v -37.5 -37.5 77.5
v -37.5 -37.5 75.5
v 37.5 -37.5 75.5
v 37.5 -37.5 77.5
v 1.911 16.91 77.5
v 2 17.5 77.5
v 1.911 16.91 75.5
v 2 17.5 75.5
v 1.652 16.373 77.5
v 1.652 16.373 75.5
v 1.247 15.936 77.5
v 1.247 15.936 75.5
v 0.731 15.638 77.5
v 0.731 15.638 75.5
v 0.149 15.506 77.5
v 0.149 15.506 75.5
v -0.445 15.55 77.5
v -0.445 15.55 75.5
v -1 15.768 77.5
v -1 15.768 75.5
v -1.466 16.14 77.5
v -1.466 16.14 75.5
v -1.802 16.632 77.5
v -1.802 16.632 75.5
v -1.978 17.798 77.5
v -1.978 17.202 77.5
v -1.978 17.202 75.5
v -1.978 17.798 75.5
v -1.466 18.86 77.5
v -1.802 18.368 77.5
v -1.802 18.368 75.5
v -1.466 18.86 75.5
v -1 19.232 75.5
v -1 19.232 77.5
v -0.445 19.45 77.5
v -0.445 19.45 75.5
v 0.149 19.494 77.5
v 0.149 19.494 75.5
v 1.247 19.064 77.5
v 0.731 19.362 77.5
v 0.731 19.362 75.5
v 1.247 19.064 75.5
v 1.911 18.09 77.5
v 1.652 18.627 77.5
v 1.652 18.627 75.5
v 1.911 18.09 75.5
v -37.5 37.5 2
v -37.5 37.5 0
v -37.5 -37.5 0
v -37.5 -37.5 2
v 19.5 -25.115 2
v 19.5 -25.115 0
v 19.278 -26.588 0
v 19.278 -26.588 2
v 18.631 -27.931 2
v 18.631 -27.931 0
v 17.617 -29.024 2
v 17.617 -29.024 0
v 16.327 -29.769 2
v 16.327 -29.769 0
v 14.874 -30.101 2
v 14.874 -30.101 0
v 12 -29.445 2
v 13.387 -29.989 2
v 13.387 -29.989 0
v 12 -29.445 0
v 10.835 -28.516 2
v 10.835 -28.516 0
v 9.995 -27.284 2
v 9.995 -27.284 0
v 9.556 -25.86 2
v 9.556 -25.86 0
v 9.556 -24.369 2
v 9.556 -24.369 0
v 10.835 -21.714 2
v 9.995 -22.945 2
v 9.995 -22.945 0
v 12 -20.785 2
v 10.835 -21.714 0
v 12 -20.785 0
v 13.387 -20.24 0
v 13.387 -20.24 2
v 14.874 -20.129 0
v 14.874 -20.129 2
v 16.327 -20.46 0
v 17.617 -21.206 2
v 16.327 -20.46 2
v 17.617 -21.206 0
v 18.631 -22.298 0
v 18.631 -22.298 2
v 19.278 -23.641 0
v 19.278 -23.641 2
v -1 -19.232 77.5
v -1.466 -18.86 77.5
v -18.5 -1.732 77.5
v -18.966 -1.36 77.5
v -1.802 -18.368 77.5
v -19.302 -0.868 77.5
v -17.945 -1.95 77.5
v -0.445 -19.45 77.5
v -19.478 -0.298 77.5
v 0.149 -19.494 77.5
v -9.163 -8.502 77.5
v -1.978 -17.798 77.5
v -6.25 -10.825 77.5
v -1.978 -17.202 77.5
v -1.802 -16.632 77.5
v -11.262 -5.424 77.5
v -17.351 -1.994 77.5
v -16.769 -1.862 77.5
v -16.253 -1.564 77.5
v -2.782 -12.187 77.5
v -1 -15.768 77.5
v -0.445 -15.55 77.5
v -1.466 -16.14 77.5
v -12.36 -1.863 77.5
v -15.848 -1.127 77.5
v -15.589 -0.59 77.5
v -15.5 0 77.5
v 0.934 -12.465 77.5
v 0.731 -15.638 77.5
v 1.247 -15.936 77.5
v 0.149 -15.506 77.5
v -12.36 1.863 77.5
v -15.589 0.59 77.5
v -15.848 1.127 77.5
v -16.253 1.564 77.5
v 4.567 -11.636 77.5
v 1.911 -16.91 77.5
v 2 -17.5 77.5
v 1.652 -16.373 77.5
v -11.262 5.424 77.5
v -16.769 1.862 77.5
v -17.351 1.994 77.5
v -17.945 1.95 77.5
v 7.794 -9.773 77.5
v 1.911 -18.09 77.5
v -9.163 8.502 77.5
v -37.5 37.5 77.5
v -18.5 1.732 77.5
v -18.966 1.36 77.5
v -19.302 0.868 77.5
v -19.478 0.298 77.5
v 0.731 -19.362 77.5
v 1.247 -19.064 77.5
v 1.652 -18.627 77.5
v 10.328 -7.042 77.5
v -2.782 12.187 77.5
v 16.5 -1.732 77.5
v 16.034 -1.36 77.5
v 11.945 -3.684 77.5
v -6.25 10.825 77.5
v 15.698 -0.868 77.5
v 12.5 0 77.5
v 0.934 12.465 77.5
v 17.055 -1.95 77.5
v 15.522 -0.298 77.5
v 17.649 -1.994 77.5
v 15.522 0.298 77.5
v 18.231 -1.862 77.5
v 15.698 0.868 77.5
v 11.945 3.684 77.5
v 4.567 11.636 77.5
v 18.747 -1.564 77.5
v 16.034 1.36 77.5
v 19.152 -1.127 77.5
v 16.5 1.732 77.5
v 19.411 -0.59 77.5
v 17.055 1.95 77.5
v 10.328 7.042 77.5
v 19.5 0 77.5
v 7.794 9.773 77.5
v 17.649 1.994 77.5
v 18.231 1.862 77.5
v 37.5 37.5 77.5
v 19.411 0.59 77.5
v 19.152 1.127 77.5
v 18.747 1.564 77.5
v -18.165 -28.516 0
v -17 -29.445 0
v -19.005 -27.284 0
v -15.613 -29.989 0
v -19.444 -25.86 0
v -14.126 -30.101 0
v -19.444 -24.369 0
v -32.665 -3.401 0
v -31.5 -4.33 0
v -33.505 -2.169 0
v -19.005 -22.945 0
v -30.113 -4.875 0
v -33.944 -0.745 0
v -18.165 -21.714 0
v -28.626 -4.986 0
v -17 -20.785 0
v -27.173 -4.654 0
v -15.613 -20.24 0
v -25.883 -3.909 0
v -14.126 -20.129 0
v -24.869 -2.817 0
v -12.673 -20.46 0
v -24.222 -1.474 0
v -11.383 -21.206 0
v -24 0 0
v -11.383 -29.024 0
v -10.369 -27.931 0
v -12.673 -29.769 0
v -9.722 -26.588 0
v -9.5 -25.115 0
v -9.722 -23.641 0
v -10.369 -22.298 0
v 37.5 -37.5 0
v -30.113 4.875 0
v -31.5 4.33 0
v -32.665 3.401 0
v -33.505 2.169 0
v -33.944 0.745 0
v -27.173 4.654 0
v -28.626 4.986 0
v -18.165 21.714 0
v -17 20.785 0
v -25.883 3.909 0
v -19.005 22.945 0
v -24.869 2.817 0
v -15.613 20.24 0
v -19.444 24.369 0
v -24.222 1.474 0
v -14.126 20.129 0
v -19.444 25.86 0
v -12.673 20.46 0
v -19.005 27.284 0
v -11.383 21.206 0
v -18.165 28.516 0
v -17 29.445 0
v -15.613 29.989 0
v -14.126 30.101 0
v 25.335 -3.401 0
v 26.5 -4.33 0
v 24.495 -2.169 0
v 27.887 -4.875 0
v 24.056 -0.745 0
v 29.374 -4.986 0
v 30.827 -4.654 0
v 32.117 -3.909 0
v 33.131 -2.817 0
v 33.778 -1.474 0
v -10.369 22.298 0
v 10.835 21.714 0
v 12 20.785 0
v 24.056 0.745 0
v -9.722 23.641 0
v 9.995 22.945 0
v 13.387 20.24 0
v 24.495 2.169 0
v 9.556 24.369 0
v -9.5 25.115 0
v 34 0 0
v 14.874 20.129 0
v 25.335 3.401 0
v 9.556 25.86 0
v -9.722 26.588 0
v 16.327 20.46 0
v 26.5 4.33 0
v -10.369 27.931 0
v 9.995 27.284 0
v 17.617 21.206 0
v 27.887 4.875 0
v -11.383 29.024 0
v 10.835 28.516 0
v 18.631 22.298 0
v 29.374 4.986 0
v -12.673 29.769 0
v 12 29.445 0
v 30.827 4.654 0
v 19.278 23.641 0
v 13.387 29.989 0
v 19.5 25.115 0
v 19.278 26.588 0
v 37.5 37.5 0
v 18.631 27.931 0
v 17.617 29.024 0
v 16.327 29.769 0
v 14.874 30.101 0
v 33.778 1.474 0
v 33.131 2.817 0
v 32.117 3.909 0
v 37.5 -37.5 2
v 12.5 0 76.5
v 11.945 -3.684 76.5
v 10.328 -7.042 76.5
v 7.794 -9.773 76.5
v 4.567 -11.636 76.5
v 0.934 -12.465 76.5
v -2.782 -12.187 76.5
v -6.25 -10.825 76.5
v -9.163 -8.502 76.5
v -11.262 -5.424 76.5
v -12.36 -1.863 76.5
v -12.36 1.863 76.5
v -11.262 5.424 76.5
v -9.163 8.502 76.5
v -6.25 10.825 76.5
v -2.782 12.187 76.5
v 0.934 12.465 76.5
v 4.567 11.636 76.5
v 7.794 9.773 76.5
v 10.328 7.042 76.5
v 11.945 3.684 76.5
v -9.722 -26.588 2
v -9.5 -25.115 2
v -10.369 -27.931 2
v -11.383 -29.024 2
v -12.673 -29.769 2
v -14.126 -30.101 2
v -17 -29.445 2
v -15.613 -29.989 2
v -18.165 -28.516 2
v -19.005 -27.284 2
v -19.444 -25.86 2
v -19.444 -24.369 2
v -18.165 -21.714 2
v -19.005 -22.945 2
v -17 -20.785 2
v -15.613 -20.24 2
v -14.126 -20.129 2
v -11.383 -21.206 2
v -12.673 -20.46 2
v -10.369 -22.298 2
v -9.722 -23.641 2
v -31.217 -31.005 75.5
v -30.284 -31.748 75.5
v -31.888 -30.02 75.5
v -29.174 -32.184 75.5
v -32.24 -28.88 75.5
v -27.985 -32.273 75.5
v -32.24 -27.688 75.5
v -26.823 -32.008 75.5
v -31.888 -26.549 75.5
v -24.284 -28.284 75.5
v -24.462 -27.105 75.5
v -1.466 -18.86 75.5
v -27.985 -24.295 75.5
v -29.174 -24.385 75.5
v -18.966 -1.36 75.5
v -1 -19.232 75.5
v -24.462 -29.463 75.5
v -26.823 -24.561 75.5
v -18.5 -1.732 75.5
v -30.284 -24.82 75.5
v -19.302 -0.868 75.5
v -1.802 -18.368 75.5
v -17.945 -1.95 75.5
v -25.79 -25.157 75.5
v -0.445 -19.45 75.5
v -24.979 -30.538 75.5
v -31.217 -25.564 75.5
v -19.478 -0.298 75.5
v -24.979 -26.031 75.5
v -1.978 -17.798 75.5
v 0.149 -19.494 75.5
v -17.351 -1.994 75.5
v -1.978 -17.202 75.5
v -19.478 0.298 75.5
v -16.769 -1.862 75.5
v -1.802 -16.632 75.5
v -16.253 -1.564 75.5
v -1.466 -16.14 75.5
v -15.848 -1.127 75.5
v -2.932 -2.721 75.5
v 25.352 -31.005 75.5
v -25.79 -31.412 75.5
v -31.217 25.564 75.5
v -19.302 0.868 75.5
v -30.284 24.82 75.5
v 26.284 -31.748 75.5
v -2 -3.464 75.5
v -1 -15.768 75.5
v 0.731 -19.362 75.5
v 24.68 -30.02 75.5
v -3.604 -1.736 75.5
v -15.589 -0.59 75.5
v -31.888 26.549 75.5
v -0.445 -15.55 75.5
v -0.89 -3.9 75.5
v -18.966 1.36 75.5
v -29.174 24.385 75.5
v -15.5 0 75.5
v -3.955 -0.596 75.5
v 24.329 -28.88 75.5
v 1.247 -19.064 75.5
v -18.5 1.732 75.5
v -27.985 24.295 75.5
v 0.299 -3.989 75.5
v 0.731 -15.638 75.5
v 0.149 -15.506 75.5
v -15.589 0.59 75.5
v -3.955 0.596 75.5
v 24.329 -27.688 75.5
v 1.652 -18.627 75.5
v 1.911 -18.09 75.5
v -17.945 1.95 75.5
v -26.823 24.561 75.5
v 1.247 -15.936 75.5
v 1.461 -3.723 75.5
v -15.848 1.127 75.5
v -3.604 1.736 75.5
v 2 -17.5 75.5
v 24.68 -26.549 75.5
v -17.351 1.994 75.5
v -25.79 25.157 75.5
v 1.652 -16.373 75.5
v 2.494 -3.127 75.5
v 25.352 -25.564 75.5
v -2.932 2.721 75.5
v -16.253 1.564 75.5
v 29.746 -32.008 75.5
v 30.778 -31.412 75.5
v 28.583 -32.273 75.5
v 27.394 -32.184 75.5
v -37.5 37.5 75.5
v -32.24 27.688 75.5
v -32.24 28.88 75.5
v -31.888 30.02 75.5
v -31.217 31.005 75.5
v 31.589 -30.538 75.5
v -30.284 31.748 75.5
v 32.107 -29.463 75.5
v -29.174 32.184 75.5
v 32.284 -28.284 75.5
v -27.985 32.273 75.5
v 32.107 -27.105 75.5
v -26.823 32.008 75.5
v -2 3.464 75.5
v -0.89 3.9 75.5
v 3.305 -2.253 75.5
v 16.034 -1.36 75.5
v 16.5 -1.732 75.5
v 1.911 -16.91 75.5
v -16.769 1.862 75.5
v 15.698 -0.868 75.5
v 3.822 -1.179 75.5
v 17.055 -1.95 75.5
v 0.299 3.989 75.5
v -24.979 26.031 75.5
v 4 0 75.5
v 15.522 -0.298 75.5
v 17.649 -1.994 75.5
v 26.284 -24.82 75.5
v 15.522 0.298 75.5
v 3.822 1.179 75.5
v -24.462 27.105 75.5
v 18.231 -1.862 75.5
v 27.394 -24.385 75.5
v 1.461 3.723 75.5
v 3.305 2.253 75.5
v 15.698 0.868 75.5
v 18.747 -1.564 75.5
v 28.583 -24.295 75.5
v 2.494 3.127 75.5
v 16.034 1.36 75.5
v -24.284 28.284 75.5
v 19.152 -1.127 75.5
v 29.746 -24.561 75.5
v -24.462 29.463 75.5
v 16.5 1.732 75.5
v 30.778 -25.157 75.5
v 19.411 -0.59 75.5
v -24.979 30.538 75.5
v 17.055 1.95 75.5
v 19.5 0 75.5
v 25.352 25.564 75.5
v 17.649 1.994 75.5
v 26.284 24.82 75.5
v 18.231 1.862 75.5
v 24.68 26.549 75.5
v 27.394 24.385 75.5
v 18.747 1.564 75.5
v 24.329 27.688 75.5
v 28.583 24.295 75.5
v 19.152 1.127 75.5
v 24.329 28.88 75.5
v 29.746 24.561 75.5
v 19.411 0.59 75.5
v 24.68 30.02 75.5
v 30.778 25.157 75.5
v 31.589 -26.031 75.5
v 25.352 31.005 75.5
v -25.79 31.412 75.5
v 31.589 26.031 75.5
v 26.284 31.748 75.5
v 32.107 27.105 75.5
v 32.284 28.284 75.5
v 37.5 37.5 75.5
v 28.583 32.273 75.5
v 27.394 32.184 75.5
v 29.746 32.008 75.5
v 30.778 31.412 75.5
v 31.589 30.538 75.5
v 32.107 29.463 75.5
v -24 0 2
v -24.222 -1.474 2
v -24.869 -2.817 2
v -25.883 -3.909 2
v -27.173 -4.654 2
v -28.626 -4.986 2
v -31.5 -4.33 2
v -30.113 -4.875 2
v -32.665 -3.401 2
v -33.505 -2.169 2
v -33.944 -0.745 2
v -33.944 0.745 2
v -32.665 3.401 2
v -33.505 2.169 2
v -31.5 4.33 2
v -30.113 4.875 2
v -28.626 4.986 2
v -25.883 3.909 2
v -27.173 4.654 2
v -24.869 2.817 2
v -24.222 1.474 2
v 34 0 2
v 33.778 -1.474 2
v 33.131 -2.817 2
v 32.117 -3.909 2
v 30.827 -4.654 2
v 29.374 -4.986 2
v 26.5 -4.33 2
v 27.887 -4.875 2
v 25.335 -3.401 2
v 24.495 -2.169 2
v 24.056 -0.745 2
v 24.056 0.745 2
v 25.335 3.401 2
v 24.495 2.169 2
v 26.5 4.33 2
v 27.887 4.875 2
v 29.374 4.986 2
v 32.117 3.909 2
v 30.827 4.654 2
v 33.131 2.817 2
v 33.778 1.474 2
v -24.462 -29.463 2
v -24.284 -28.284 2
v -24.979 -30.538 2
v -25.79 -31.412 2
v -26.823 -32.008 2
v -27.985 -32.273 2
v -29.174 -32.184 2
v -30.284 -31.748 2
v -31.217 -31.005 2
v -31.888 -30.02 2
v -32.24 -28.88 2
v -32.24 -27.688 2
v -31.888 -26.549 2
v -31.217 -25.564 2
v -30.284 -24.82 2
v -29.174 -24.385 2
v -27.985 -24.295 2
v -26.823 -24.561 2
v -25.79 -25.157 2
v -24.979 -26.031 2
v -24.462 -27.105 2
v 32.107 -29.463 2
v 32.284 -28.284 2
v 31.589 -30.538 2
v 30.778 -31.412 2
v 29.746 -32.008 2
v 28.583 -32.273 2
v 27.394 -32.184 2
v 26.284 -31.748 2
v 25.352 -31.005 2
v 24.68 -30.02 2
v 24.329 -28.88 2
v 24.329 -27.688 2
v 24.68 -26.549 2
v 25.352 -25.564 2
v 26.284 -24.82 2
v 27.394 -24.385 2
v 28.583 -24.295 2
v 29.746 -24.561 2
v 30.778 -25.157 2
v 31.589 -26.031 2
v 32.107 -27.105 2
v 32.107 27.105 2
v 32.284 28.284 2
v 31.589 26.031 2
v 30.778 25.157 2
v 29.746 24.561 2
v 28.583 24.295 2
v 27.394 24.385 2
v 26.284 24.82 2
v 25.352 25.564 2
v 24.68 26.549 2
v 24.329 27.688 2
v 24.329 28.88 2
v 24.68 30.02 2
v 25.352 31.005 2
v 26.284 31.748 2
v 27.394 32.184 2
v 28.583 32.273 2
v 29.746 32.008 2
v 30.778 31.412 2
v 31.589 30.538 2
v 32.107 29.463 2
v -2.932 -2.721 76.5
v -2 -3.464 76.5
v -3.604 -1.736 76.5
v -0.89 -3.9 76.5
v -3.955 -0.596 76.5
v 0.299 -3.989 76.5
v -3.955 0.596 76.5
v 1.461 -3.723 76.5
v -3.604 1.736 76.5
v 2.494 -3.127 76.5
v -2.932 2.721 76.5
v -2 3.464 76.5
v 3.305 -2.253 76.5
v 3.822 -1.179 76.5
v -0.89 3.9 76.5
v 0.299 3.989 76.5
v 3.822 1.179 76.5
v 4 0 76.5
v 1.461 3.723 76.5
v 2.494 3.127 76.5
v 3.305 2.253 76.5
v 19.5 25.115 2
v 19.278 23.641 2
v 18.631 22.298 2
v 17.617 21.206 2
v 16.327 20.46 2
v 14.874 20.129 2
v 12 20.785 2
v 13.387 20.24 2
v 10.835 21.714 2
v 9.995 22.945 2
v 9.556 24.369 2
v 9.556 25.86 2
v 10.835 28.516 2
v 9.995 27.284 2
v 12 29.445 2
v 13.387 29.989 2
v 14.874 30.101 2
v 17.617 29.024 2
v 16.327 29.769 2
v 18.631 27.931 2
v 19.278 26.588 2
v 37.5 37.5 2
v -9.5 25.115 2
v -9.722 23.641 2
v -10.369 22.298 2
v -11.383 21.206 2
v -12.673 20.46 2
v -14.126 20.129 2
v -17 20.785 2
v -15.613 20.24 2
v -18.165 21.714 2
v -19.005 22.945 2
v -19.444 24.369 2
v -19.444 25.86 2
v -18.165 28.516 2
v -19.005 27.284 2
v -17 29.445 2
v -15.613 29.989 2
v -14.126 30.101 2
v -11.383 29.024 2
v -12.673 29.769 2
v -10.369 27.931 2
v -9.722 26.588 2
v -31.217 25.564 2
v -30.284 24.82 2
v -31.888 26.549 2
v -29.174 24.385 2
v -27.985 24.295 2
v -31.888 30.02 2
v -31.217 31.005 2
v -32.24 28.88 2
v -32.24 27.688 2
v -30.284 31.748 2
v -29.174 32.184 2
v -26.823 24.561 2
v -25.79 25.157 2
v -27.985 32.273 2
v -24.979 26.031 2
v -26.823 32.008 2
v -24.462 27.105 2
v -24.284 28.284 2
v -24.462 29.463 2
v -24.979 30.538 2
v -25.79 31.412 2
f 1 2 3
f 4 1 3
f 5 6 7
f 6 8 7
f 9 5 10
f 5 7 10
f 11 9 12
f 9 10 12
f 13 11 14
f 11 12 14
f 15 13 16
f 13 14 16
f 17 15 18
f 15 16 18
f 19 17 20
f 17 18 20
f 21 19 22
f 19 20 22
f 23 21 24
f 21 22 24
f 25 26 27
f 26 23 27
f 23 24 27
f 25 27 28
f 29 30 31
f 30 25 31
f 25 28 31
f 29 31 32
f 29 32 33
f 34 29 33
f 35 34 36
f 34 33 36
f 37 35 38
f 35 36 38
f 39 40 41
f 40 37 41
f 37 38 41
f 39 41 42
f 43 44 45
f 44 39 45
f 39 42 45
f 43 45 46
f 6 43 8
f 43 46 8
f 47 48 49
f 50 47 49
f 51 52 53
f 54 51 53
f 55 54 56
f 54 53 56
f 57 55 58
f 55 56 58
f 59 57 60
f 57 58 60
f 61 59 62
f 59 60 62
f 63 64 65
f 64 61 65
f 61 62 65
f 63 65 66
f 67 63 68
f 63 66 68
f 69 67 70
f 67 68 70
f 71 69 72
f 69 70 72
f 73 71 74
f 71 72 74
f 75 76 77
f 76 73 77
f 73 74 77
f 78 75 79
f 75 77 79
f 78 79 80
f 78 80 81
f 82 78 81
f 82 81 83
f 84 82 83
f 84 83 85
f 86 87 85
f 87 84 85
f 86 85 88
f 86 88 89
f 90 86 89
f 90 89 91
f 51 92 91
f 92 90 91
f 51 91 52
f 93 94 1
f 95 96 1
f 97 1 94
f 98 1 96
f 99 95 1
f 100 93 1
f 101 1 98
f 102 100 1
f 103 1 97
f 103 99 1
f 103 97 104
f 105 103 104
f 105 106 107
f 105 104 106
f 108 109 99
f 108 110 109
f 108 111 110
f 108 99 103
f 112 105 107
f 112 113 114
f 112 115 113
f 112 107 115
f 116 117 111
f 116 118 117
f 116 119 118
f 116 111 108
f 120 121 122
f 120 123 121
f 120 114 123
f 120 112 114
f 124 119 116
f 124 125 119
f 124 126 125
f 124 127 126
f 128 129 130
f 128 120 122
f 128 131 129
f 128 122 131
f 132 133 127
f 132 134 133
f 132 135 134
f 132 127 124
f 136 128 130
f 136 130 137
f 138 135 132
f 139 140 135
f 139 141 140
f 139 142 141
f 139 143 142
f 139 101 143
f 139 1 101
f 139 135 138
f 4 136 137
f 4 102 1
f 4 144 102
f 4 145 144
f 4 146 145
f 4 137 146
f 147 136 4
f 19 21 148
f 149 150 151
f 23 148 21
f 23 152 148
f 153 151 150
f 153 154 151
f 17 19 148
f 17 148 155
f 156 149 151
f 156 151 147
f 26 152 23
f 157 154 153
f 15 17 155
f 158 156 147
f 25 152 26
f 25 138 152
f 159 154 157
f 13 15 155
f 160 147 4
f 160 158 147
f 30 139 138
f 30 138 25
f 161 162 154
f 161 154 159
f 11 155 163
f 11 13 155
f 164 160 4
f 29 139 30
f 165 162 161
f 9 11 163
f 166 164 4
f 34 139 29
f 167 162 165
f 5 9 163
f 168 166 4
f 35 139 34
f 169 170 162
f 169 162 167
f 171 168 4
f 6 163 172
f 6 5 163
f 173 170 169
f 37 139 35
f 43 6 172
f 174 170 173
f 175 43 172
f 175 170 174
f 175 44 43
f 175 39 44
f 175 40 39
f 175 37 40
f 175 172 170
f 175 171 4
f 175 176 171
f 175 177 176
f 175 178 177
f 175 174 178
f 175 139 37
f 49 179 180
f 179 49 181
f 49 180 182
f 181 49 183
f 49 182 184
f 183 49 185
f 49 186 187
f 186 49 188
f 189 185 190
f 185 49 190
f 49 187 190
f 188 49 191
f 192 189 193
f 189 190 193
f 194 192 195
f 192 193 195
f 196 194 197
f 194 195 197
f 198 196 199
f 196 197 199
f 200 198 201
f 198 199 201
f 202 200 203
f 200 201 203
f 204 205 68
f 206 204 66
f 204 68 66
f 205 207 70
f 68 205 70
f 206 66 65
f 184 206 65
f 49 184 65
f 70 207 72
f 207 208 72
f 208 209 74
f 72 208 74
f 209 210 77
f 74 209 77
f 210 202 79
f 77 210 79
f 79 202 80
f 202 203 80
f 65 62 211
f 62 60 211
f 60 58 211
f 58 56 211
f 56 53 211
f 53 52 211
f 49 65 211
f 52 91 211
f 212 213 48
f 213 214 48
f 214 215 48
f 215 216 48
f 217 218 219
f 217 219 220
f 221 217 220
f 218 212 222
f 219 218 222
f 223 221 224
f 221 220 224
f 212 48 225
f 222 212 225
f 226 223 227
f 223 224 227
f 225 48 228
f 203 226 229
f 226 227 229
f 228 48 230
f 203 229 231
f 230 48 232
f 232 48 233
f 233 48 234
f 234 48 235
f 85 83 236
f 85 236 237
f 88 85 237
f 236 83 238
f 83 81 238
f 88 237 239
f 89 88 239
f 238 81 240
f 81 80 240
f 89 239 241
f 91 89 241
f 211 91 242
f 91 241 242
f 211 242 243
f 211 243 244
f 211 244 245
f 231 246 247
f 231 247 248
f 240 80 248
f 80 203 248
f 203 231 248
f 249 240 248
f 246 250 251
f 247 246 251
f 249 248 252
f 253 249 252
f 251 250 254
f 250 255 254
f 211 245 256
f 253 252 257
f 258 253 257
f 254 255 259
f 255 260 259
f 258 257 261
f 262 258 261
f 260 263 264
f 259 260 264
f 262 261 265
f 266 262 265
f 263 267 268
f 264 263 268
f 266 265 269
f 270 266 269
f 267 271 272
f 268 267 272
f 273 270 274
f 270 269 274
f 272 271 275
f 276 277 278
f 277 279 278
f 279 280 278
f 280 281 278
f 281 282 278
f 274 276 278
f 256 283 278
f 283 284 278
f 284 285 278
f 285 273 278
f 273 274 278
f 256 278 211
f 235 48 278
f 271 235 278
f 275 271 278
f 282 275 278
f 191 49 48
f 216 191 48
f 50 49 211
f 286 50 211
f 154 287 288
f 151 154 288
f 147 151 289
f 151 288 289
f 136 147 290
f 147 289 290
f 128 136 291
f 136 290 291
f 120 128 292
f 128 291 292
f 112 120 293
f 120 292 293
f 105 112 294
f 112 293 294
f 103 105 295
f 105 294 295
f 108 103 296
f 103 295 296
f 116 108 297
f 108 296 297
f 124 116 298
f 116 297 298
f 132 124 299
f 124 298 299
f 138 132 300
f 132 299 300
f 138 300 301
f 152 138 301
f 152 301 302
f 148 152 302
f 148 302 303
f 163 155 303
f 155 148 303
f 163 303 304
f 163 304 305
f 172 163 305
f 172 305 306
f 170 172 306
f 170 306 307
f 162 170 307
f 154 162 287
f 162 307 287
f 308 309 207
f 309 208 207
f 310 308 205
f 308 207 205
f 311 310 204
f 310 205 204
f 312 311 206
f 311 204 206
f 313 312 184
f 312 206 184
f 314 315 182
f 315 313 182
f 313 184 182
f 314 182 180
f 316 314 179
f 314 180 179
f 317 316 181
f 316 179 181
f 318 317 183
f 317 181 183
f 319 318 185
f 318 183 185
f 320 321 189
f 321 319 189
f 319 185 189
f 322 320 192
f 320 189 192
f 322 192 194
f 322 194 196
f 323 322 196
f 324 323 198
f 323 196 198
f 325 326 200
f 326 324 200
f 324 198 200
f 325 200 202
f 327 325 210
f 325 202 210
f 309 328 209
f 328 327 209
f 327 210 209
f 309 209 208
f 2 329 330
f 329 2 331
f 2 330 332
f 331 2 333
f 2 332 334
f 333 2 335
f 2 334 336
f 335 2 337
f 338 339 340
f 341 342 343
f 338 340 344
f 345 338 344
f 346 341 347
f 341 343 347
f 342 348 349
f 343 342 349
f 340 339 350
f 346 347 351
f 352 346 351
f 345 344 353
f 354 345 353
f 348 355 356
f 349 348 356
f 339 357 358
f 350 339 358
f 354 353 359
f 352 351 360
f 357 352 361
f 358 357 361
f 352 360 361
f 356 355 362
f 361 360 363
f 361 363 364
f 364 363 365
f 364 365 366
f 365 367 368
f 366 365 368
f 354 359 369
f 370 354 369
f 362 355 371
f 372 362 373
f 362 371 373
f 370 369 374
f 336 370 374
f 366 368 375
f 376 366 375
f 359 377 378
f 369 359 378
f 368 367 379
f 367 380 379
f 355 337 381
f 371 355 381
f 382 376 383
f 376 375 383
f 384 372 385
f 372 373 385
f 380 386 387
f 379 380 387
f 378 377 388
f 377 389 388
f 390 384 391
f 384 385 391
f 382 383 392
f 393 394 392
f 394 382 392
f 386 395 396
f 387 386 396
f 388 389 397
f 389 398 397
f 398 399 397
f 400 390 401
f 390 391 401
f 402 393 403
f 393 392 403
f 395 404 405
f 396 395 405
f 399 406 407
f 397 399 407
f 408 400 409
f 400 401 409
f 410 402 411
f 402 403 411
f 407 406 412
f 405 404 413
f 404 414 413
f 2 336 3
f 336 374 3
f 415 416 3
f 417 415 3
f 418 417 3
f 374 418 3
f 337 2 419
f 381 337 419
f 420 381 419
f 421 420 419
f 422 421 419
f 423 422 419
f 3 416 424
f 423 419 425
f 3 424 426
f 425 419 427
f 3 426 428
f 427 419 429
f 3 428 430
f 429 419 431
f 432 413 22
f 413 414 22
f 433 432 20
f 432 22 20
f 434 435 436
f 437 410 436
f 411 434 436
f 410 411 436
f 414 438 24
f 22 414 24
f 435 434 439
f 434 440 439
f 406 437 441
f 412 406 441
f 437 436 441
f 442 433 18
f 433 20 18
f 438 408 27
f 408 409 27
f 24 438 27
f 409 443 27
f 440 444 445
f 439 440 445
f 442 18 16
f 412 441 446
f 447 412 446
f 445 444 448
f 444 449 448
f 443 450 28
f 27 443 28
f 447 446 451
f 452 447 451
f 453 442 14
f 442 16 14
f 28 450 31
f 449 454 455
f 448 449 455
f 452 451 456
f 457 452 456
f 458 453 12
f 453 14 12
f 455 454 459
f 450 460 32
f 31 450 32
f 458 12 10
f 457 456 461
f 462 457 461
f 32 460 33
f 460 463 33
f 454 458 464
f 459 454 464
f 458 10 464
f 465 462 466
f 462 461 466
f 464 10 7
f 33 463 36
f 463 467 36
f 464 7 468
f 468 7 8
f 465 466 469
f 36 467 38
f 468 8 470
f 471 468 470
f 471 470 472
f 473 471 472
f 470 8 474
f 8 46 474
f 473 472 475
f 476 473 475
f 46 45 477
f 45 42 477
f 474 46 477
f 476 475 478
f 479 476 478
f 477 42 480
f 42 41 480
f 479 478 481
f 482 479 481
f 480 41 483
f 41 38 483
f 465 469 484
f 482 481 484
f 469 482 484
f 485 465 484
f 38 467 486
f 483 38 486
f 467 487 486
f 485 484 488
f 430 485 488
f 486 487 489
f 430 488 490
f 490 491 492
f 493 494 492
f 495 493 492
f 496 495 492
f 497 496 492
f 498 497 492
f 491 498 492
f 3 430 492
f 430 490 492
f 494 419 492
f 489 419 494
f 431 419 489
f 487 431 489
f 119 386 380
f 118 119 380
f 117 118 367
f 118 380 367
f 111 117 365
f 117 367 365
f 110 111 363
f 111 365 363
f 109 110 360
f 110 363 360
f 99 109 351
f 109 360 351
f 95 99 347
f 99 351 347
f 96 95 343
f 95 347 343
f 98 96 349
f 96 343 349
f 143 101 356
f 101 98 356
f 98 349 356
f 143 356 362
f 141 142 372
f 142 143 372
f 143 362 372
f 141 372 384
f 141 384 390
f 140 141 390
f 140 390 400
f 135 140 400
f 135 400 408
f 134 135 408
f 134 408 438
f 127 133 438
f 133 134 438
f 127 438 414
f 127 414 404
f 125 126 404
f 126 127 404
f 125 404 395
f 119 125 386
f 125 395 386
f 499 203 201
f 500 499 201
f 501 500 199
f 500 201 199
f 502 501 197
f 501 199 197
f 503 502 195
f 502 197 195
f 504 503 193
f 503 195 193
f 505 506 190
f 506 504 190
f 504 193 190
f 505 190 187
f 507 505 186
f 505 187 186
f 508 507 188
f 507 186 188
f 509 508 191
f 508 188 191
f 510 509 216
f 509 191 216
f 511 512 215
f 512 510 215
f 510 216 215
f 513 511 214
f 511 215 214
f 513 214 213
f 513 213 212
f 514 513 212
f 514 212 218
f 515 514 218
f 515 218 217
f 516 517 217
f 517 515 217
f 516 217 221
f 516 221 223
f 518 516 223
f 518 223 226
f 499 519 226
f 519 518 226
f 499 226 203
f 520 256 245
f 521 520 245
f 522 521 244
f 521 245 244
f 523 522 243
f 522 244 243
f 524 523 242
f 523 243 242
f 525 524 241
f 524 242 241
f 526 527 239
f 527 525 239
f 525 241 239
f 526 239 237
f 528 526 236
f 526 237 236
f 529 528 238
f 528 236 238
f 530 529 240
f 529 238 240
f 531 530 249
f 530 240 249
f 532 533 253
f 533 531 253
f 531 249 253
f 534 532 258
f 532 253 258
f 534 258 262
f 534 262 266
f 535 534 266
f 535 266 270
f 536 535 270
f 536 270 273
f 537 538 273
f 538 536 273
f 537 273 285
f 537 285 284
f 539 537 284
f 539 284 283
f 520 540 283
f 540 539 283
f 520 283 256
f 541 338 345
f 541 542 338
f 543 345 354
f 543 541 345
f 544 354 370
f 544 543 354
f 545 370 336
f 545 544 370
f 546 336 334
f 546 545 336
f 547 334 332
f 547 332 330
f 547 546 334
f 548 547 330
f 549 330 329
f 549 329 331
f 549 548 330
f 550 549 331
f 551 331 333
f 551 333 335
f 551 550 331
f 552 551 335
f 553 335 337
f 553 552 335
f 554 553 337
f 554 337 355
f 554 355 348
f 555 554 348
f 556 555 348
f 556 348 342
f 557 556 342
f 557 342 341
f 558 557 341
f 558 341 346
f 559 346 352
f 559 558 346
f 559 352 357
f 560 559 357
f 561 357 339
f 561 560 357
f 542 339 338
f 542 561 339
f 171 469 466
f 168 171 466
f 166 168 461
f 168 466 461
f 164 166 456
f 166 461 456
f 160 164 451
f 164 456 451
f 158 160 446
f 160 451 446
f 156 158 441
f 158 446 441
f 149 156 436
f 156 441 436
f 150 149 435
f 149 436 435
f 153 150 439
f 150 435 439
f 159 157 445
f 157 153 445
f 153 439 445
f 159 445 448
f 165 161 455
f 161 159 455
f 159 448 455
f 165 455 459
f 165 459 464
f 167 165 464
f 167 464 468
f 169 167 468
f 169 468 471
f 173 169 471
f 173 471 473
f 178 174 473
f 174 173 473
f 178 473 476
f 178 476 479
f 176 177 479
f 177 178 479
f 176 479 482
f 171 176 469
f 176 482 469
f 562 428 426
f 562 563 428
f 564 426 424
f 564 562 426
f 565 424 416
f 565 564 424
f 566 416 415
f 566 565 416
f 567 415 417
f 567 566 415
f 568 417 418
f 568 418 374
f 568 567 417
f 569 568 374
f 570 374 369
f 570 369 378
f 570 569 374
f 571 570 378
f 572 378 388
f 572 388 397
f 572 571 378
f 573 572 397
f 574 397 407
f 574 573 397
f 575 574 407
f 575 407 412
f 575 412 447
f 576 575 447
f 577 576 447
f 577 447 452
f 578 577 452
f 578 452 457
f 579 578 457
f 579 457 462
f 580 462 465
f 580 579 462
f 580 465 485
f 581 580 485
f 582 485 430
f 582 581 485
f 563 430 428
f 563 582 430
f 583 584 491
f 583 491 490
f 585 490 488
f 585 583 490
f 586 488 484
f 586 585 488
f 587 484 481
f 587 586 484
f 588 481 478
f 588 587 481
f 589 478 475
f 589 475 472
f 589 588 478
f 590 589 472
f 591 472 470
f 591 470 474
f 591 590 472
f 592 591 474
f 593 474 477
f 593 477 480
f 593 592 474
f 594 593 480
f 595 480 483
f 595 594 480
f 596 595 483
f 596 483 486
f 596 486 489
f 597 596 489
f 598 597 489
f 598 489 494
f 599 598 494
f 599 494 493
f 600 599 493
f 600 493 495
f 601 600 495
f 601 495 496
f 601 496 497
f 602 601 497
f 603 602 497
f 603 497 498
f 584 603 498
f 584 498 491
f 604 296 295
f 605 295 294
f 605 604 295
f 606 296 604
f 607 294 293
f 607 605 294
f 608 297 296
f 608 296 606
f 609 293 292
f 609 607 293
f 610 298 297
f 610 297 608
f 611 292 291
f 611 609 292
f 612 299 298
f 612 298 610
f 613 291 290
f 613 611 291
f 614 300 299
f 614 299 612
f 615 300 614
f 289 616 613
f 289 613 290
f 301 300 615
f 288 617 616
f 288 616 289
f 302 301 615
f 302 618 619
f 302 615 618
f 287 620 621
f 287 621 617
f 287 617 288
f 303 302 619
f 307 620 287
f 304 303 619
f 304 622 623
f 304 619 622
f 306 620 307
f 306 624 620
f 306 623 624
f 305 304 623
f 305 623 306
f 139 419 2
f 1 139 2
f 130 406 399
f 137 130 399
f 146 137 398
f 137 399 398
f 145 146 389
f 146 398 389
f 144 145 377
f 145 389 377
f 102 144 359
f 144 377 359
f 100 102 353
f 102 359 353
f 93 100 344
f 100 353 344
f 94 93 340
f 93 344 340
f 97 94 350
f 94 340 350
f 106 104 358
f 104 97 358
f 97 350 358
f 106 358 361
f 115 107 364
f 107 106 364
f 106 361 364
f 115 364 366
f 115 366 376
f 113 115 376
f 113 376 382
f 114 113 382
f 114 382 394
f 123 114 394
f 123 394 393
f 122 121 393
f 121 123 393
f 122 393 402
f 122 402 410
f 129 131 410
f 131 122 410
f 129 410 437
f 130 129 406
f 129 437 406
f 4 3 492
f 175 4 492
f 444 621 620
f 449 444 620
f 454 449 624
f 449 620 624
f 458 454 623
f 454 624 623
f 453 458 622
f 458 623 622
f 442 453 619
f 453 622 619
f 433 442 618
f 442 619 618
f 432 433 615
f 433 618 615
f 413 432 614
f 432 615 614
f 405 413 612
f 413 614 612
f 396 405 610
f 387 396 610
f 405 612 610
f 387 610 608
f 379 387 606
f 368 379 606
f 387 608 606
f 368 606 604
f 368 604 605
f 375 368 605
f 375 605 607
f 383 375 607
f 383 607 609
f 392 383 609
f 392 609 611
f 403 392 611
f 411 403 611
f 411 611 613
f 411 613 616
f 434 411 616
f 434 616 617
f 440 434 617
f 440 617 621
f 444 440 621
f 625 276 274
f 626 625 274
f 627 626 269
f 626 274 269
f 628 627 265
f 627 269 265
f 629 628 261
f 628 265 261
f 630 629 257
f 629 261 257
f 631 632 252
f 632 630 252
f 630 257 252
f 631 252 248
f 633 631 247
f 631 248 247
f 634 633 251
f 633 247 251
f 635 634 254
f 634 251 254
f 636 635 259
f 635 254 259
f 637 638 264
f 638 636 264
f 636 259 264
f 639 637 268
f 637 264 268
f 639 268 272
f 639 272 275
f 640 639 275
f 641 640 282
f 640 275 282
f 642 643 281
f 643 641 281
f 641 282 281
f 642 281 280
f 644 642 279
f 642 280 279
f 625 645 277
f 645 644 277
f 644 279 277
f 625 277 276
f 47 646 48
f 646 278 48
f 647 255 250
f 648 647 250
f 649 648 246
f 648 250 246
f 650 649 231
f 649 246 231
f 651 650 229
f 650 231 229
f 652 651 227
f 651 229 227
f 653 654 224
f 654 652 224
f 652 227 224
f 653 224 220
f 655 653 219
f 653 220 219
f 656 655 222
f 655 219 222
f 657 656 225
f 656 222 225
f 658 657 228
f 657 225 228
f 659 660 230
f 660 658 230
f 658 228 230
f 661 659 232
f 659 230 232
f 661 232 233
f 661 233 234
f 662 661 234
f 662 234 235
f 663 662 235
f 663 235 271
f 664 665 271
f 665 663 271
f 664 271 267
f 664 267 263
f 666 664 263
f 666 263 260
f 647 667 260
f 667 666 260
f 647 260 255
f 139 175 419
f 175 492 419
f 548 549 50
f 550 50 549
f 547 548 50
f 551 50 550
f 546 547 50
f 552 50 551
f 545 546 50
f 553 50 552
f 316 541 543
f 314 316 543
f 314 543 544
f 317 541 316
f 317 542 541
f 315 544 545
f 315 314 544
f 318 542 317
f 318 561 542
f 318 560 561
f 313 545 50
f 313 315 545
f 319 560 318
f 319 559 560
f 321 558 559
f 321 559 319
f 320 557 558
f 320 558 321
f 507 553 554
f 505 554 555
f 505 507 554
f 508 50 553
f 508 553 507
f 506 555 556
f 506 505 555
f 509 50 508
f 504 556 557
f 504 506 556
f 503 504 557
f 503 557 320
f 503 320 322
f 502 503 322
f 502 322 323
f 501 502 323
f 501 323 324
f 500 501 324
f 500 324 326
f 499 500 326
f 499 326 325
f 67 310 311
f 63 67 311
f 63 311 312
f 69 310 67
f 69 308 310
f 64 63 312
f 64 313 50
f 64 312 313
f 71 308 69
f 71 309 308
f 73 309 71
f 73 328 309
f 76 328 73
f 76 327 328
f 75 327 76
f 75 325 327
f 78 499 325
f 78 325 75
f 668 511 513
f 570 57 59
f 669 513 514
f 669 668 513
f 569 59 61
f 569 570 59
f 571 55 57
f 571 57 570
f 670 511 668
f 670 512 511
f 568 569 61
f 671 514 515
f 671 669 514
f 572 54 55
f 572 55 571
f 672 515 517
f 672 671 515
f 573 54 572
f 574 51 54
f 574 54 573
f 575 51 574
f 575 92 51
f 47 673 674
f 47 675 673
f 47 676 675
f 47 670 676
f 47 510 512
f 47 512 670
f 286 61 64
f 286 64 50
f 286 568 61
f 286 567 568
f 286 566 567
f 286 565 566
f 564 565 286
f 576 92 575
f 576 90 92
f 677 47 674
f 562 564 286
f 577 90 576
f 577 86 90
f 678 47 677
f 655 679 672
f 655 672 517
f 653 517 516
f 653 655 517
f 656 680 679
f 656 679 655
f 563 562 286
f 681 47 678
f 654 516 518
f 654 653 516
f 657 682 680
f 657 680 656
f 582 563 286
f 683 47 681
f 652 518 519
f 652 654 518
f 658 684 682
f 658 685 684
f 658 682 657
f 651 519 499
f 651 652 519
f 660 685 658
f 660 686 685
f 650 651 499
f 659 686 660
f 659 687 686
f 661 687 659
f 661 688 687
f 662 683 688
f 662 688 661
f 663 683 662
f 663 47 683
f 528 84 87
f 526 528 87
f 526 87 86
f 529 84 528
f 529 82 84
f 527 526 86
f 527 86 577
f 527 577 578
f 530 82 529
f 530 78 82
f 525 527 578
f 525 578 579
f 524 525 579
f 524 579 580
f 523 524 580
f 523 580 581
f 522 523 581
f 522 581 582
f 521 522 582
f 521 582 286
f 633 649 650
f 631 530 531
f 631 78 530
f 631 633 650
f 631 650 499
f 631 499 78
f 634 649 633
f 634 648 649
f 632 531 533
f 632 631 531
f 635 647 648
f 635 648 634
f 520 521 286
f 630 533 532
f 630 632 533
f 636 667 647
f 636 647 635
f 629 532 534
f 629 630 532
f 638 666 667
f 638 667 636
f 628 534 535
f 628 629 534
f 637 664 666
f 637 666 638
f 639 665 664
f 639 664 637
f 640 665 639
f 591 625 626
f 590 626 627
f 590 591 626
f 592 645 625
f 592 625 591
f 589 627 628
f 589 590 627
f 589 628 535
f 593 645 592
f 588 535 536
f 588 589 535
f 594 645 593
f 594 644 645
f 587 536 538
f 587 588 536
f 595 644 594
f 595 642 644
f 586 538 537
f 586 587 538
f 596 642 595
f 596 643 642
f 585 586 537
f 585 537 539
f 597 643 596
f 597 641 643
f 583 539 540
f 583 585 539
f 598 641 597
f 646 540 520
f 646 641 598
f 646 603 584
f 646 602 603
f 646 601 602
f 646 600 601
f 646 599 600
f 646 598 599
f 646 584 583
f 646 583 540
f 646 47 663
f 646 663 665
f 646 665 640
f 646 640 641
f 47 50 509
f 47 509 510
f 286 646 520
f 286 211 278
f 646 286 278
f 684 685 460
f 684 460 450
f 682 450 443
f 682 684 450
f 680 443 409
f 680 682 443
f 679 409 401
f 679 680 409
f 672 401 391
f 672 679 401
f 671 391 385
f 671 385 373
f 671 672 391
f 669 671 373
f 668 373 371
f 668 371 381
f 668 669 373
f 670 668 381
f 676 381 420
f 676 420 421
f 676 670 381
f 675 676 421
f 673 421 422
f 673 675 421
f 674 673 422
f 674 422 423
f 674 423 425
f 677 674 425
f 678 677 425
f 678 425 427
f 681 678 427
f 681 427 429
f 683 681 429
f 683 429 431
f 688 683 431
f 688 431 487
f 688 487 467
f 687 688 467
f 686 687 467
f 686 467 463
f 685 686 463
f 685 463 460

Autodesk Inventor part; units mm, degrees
ref_plane "YZ Plane" through (0, 0, 0) normal (1, 0, 0) x (0, 1, 0)
ref_plane "XZ Plane" through (0, 0, 0) normal (0, 1, 0) x (-1, 0, 0)
ref_plane "Work Plane1" through (0, 0, 0) normal (0, 0, 1) x (1, 0, 0)
sketch "Sketch1" plane through (0, 0, 0) normal (0, 0, 1) x (1, 0, 0)
  line L0 (-37.5, -37.5) -> (37.5, -37.5)
  line L1 (37.5, -37.5) -> (37.5, 37.5)
  line L2 (37.5, 37.5) -> (-37.5, 37.5)
  line L3 (-37.5, 37.5) -> (-37.5, -37.5)
  line L4 (-37.5, -37.5) -> (37.5, 37.5) construction
  line L5 (37.5, -37.5) -> (-37.5, 37.5) construction
  circle A0 centre (14.5, 25.1147) radius 5 projected
  circle A1 centre (-14.5, 25.1147) radius 5 projected
  circle A2 centre (-29, 0) radius 5 projected
  circle A3 centre (29, 0) radius 5 projected
  circle A4 centre (14.5, -25.1147) radius 5 projected
  circle A5 centre (-14.5, -25.1147) radius 5 projected
  point P0 (0, 0)
  dimension "d0" = 75
extrude "Extrusion1" add sketch "Sketch1" along normal blind 2
sketch "Sketch2" plane through (0, 0, 2) normal (0, 0, 1) x (1, 0, 0)
  circle A0 centre (0, 0) radius 40 construction
  line L0 (28.2843, -28.2843) -> (-28.2843, -28.2843) construction
  line L1 (-28.2843, -28.2843) -> (-28.2843, 28.2843) construction
  line L2 (-28.2843, 28.2843) -> (28.2843, 28.2843) construction
  line L3 (28.2843, 28.2843) -> (28.2843, -28.2843) construction
  line L4 (28.2843, -28.2843) -> (-28.2843, 28.2843) construction
  line L5 (-28.2843, -28.2843) -> (28.2843, 28.2843) construction
  circle A1 centre (-28.2843, 28.2843) radius 4
  circle A2 centre (-28.2843, -28.2843) radius 4
  circle A3 centre (28.2843, -28.2843) radius 4
  circle A4 centre (28.2843, 28.2843) radius 4
  dimension "d3" = 80
  dimension "d4" = 8
  dimension "d7" = 360
ref_plane "Work Plane2" through (-15.0271, -15.0271, 76.5) normal (0, 0, -1) x (0, 1, 0)
extrude "Extrusion2" add sketch "Sketch2" along normal up to surface (74.5 mm away)
sketch "Sketch3" plane through (28.2843, 28.2843, 76.5) normal (0, 0, 1) x (1, 0, 0)
  circle A0 centre (-45.7843, -28.2843) radius 2 projected
  circle A1 centre (-28.2843, -10.7843) radius 2 projected
  circle A2 centre (-28.2843, -45.7843) radius 2 projected
  circle A3 centre (-10.7843, -28.2843) radius 2 projected
  circle A4 centre (-28.2843, -28.2843) radius 4 projected
  line L0 (-65.7843, 9.2157) -> (-65.7843, -65.7843) projected
  line L1 (9.2157, 9.2157) -> (-65.7843, 9.2157) projected
  line L2 (9.2157, -65.7843) -> (9.2157, 9.2157) projected
  line L3 (-65.7843, -65.7843) -> (9.2157, -65.7843) projected
  point P0 (-28.2843, -28.2843)
extrude "Extrusion3" add sketch "Sketch3" against normal blind 1
sketch "Sketch4" plane through (-37.5, -37.5, 76.5) normal (0, 0, 1) x (1, 0, 0)
  line L0 (0, 75) -> (0, 0) projected
  line L1 (0, 0) -> (75, 0) projected
  line L2 (75, 0) -> (75, 75) projected
  line L3 (75, 75) -> (0, 75) projected
  circle A0 centre (20, 37.5) radius 2 projected
  circle A1 centre (37.5, 55) radius 2 projected
  circle A2 centre (37.5, 20) radius 2 projected
  circle A3 centre (55, 37.5) radius 2 projected
  circle A4 centre (37.5, 37.5) radius 4 projected
  circle A5 centre (37.5, 37.5) radius 12.5 projected
  point P0 (37.5, 37.5)
extrude "Extrusion4" add sketch "Sketch4" along normal blind 1 contours L3 L2 L1 L0
properties part number "mega troque motor to nmrv-50 flange"
